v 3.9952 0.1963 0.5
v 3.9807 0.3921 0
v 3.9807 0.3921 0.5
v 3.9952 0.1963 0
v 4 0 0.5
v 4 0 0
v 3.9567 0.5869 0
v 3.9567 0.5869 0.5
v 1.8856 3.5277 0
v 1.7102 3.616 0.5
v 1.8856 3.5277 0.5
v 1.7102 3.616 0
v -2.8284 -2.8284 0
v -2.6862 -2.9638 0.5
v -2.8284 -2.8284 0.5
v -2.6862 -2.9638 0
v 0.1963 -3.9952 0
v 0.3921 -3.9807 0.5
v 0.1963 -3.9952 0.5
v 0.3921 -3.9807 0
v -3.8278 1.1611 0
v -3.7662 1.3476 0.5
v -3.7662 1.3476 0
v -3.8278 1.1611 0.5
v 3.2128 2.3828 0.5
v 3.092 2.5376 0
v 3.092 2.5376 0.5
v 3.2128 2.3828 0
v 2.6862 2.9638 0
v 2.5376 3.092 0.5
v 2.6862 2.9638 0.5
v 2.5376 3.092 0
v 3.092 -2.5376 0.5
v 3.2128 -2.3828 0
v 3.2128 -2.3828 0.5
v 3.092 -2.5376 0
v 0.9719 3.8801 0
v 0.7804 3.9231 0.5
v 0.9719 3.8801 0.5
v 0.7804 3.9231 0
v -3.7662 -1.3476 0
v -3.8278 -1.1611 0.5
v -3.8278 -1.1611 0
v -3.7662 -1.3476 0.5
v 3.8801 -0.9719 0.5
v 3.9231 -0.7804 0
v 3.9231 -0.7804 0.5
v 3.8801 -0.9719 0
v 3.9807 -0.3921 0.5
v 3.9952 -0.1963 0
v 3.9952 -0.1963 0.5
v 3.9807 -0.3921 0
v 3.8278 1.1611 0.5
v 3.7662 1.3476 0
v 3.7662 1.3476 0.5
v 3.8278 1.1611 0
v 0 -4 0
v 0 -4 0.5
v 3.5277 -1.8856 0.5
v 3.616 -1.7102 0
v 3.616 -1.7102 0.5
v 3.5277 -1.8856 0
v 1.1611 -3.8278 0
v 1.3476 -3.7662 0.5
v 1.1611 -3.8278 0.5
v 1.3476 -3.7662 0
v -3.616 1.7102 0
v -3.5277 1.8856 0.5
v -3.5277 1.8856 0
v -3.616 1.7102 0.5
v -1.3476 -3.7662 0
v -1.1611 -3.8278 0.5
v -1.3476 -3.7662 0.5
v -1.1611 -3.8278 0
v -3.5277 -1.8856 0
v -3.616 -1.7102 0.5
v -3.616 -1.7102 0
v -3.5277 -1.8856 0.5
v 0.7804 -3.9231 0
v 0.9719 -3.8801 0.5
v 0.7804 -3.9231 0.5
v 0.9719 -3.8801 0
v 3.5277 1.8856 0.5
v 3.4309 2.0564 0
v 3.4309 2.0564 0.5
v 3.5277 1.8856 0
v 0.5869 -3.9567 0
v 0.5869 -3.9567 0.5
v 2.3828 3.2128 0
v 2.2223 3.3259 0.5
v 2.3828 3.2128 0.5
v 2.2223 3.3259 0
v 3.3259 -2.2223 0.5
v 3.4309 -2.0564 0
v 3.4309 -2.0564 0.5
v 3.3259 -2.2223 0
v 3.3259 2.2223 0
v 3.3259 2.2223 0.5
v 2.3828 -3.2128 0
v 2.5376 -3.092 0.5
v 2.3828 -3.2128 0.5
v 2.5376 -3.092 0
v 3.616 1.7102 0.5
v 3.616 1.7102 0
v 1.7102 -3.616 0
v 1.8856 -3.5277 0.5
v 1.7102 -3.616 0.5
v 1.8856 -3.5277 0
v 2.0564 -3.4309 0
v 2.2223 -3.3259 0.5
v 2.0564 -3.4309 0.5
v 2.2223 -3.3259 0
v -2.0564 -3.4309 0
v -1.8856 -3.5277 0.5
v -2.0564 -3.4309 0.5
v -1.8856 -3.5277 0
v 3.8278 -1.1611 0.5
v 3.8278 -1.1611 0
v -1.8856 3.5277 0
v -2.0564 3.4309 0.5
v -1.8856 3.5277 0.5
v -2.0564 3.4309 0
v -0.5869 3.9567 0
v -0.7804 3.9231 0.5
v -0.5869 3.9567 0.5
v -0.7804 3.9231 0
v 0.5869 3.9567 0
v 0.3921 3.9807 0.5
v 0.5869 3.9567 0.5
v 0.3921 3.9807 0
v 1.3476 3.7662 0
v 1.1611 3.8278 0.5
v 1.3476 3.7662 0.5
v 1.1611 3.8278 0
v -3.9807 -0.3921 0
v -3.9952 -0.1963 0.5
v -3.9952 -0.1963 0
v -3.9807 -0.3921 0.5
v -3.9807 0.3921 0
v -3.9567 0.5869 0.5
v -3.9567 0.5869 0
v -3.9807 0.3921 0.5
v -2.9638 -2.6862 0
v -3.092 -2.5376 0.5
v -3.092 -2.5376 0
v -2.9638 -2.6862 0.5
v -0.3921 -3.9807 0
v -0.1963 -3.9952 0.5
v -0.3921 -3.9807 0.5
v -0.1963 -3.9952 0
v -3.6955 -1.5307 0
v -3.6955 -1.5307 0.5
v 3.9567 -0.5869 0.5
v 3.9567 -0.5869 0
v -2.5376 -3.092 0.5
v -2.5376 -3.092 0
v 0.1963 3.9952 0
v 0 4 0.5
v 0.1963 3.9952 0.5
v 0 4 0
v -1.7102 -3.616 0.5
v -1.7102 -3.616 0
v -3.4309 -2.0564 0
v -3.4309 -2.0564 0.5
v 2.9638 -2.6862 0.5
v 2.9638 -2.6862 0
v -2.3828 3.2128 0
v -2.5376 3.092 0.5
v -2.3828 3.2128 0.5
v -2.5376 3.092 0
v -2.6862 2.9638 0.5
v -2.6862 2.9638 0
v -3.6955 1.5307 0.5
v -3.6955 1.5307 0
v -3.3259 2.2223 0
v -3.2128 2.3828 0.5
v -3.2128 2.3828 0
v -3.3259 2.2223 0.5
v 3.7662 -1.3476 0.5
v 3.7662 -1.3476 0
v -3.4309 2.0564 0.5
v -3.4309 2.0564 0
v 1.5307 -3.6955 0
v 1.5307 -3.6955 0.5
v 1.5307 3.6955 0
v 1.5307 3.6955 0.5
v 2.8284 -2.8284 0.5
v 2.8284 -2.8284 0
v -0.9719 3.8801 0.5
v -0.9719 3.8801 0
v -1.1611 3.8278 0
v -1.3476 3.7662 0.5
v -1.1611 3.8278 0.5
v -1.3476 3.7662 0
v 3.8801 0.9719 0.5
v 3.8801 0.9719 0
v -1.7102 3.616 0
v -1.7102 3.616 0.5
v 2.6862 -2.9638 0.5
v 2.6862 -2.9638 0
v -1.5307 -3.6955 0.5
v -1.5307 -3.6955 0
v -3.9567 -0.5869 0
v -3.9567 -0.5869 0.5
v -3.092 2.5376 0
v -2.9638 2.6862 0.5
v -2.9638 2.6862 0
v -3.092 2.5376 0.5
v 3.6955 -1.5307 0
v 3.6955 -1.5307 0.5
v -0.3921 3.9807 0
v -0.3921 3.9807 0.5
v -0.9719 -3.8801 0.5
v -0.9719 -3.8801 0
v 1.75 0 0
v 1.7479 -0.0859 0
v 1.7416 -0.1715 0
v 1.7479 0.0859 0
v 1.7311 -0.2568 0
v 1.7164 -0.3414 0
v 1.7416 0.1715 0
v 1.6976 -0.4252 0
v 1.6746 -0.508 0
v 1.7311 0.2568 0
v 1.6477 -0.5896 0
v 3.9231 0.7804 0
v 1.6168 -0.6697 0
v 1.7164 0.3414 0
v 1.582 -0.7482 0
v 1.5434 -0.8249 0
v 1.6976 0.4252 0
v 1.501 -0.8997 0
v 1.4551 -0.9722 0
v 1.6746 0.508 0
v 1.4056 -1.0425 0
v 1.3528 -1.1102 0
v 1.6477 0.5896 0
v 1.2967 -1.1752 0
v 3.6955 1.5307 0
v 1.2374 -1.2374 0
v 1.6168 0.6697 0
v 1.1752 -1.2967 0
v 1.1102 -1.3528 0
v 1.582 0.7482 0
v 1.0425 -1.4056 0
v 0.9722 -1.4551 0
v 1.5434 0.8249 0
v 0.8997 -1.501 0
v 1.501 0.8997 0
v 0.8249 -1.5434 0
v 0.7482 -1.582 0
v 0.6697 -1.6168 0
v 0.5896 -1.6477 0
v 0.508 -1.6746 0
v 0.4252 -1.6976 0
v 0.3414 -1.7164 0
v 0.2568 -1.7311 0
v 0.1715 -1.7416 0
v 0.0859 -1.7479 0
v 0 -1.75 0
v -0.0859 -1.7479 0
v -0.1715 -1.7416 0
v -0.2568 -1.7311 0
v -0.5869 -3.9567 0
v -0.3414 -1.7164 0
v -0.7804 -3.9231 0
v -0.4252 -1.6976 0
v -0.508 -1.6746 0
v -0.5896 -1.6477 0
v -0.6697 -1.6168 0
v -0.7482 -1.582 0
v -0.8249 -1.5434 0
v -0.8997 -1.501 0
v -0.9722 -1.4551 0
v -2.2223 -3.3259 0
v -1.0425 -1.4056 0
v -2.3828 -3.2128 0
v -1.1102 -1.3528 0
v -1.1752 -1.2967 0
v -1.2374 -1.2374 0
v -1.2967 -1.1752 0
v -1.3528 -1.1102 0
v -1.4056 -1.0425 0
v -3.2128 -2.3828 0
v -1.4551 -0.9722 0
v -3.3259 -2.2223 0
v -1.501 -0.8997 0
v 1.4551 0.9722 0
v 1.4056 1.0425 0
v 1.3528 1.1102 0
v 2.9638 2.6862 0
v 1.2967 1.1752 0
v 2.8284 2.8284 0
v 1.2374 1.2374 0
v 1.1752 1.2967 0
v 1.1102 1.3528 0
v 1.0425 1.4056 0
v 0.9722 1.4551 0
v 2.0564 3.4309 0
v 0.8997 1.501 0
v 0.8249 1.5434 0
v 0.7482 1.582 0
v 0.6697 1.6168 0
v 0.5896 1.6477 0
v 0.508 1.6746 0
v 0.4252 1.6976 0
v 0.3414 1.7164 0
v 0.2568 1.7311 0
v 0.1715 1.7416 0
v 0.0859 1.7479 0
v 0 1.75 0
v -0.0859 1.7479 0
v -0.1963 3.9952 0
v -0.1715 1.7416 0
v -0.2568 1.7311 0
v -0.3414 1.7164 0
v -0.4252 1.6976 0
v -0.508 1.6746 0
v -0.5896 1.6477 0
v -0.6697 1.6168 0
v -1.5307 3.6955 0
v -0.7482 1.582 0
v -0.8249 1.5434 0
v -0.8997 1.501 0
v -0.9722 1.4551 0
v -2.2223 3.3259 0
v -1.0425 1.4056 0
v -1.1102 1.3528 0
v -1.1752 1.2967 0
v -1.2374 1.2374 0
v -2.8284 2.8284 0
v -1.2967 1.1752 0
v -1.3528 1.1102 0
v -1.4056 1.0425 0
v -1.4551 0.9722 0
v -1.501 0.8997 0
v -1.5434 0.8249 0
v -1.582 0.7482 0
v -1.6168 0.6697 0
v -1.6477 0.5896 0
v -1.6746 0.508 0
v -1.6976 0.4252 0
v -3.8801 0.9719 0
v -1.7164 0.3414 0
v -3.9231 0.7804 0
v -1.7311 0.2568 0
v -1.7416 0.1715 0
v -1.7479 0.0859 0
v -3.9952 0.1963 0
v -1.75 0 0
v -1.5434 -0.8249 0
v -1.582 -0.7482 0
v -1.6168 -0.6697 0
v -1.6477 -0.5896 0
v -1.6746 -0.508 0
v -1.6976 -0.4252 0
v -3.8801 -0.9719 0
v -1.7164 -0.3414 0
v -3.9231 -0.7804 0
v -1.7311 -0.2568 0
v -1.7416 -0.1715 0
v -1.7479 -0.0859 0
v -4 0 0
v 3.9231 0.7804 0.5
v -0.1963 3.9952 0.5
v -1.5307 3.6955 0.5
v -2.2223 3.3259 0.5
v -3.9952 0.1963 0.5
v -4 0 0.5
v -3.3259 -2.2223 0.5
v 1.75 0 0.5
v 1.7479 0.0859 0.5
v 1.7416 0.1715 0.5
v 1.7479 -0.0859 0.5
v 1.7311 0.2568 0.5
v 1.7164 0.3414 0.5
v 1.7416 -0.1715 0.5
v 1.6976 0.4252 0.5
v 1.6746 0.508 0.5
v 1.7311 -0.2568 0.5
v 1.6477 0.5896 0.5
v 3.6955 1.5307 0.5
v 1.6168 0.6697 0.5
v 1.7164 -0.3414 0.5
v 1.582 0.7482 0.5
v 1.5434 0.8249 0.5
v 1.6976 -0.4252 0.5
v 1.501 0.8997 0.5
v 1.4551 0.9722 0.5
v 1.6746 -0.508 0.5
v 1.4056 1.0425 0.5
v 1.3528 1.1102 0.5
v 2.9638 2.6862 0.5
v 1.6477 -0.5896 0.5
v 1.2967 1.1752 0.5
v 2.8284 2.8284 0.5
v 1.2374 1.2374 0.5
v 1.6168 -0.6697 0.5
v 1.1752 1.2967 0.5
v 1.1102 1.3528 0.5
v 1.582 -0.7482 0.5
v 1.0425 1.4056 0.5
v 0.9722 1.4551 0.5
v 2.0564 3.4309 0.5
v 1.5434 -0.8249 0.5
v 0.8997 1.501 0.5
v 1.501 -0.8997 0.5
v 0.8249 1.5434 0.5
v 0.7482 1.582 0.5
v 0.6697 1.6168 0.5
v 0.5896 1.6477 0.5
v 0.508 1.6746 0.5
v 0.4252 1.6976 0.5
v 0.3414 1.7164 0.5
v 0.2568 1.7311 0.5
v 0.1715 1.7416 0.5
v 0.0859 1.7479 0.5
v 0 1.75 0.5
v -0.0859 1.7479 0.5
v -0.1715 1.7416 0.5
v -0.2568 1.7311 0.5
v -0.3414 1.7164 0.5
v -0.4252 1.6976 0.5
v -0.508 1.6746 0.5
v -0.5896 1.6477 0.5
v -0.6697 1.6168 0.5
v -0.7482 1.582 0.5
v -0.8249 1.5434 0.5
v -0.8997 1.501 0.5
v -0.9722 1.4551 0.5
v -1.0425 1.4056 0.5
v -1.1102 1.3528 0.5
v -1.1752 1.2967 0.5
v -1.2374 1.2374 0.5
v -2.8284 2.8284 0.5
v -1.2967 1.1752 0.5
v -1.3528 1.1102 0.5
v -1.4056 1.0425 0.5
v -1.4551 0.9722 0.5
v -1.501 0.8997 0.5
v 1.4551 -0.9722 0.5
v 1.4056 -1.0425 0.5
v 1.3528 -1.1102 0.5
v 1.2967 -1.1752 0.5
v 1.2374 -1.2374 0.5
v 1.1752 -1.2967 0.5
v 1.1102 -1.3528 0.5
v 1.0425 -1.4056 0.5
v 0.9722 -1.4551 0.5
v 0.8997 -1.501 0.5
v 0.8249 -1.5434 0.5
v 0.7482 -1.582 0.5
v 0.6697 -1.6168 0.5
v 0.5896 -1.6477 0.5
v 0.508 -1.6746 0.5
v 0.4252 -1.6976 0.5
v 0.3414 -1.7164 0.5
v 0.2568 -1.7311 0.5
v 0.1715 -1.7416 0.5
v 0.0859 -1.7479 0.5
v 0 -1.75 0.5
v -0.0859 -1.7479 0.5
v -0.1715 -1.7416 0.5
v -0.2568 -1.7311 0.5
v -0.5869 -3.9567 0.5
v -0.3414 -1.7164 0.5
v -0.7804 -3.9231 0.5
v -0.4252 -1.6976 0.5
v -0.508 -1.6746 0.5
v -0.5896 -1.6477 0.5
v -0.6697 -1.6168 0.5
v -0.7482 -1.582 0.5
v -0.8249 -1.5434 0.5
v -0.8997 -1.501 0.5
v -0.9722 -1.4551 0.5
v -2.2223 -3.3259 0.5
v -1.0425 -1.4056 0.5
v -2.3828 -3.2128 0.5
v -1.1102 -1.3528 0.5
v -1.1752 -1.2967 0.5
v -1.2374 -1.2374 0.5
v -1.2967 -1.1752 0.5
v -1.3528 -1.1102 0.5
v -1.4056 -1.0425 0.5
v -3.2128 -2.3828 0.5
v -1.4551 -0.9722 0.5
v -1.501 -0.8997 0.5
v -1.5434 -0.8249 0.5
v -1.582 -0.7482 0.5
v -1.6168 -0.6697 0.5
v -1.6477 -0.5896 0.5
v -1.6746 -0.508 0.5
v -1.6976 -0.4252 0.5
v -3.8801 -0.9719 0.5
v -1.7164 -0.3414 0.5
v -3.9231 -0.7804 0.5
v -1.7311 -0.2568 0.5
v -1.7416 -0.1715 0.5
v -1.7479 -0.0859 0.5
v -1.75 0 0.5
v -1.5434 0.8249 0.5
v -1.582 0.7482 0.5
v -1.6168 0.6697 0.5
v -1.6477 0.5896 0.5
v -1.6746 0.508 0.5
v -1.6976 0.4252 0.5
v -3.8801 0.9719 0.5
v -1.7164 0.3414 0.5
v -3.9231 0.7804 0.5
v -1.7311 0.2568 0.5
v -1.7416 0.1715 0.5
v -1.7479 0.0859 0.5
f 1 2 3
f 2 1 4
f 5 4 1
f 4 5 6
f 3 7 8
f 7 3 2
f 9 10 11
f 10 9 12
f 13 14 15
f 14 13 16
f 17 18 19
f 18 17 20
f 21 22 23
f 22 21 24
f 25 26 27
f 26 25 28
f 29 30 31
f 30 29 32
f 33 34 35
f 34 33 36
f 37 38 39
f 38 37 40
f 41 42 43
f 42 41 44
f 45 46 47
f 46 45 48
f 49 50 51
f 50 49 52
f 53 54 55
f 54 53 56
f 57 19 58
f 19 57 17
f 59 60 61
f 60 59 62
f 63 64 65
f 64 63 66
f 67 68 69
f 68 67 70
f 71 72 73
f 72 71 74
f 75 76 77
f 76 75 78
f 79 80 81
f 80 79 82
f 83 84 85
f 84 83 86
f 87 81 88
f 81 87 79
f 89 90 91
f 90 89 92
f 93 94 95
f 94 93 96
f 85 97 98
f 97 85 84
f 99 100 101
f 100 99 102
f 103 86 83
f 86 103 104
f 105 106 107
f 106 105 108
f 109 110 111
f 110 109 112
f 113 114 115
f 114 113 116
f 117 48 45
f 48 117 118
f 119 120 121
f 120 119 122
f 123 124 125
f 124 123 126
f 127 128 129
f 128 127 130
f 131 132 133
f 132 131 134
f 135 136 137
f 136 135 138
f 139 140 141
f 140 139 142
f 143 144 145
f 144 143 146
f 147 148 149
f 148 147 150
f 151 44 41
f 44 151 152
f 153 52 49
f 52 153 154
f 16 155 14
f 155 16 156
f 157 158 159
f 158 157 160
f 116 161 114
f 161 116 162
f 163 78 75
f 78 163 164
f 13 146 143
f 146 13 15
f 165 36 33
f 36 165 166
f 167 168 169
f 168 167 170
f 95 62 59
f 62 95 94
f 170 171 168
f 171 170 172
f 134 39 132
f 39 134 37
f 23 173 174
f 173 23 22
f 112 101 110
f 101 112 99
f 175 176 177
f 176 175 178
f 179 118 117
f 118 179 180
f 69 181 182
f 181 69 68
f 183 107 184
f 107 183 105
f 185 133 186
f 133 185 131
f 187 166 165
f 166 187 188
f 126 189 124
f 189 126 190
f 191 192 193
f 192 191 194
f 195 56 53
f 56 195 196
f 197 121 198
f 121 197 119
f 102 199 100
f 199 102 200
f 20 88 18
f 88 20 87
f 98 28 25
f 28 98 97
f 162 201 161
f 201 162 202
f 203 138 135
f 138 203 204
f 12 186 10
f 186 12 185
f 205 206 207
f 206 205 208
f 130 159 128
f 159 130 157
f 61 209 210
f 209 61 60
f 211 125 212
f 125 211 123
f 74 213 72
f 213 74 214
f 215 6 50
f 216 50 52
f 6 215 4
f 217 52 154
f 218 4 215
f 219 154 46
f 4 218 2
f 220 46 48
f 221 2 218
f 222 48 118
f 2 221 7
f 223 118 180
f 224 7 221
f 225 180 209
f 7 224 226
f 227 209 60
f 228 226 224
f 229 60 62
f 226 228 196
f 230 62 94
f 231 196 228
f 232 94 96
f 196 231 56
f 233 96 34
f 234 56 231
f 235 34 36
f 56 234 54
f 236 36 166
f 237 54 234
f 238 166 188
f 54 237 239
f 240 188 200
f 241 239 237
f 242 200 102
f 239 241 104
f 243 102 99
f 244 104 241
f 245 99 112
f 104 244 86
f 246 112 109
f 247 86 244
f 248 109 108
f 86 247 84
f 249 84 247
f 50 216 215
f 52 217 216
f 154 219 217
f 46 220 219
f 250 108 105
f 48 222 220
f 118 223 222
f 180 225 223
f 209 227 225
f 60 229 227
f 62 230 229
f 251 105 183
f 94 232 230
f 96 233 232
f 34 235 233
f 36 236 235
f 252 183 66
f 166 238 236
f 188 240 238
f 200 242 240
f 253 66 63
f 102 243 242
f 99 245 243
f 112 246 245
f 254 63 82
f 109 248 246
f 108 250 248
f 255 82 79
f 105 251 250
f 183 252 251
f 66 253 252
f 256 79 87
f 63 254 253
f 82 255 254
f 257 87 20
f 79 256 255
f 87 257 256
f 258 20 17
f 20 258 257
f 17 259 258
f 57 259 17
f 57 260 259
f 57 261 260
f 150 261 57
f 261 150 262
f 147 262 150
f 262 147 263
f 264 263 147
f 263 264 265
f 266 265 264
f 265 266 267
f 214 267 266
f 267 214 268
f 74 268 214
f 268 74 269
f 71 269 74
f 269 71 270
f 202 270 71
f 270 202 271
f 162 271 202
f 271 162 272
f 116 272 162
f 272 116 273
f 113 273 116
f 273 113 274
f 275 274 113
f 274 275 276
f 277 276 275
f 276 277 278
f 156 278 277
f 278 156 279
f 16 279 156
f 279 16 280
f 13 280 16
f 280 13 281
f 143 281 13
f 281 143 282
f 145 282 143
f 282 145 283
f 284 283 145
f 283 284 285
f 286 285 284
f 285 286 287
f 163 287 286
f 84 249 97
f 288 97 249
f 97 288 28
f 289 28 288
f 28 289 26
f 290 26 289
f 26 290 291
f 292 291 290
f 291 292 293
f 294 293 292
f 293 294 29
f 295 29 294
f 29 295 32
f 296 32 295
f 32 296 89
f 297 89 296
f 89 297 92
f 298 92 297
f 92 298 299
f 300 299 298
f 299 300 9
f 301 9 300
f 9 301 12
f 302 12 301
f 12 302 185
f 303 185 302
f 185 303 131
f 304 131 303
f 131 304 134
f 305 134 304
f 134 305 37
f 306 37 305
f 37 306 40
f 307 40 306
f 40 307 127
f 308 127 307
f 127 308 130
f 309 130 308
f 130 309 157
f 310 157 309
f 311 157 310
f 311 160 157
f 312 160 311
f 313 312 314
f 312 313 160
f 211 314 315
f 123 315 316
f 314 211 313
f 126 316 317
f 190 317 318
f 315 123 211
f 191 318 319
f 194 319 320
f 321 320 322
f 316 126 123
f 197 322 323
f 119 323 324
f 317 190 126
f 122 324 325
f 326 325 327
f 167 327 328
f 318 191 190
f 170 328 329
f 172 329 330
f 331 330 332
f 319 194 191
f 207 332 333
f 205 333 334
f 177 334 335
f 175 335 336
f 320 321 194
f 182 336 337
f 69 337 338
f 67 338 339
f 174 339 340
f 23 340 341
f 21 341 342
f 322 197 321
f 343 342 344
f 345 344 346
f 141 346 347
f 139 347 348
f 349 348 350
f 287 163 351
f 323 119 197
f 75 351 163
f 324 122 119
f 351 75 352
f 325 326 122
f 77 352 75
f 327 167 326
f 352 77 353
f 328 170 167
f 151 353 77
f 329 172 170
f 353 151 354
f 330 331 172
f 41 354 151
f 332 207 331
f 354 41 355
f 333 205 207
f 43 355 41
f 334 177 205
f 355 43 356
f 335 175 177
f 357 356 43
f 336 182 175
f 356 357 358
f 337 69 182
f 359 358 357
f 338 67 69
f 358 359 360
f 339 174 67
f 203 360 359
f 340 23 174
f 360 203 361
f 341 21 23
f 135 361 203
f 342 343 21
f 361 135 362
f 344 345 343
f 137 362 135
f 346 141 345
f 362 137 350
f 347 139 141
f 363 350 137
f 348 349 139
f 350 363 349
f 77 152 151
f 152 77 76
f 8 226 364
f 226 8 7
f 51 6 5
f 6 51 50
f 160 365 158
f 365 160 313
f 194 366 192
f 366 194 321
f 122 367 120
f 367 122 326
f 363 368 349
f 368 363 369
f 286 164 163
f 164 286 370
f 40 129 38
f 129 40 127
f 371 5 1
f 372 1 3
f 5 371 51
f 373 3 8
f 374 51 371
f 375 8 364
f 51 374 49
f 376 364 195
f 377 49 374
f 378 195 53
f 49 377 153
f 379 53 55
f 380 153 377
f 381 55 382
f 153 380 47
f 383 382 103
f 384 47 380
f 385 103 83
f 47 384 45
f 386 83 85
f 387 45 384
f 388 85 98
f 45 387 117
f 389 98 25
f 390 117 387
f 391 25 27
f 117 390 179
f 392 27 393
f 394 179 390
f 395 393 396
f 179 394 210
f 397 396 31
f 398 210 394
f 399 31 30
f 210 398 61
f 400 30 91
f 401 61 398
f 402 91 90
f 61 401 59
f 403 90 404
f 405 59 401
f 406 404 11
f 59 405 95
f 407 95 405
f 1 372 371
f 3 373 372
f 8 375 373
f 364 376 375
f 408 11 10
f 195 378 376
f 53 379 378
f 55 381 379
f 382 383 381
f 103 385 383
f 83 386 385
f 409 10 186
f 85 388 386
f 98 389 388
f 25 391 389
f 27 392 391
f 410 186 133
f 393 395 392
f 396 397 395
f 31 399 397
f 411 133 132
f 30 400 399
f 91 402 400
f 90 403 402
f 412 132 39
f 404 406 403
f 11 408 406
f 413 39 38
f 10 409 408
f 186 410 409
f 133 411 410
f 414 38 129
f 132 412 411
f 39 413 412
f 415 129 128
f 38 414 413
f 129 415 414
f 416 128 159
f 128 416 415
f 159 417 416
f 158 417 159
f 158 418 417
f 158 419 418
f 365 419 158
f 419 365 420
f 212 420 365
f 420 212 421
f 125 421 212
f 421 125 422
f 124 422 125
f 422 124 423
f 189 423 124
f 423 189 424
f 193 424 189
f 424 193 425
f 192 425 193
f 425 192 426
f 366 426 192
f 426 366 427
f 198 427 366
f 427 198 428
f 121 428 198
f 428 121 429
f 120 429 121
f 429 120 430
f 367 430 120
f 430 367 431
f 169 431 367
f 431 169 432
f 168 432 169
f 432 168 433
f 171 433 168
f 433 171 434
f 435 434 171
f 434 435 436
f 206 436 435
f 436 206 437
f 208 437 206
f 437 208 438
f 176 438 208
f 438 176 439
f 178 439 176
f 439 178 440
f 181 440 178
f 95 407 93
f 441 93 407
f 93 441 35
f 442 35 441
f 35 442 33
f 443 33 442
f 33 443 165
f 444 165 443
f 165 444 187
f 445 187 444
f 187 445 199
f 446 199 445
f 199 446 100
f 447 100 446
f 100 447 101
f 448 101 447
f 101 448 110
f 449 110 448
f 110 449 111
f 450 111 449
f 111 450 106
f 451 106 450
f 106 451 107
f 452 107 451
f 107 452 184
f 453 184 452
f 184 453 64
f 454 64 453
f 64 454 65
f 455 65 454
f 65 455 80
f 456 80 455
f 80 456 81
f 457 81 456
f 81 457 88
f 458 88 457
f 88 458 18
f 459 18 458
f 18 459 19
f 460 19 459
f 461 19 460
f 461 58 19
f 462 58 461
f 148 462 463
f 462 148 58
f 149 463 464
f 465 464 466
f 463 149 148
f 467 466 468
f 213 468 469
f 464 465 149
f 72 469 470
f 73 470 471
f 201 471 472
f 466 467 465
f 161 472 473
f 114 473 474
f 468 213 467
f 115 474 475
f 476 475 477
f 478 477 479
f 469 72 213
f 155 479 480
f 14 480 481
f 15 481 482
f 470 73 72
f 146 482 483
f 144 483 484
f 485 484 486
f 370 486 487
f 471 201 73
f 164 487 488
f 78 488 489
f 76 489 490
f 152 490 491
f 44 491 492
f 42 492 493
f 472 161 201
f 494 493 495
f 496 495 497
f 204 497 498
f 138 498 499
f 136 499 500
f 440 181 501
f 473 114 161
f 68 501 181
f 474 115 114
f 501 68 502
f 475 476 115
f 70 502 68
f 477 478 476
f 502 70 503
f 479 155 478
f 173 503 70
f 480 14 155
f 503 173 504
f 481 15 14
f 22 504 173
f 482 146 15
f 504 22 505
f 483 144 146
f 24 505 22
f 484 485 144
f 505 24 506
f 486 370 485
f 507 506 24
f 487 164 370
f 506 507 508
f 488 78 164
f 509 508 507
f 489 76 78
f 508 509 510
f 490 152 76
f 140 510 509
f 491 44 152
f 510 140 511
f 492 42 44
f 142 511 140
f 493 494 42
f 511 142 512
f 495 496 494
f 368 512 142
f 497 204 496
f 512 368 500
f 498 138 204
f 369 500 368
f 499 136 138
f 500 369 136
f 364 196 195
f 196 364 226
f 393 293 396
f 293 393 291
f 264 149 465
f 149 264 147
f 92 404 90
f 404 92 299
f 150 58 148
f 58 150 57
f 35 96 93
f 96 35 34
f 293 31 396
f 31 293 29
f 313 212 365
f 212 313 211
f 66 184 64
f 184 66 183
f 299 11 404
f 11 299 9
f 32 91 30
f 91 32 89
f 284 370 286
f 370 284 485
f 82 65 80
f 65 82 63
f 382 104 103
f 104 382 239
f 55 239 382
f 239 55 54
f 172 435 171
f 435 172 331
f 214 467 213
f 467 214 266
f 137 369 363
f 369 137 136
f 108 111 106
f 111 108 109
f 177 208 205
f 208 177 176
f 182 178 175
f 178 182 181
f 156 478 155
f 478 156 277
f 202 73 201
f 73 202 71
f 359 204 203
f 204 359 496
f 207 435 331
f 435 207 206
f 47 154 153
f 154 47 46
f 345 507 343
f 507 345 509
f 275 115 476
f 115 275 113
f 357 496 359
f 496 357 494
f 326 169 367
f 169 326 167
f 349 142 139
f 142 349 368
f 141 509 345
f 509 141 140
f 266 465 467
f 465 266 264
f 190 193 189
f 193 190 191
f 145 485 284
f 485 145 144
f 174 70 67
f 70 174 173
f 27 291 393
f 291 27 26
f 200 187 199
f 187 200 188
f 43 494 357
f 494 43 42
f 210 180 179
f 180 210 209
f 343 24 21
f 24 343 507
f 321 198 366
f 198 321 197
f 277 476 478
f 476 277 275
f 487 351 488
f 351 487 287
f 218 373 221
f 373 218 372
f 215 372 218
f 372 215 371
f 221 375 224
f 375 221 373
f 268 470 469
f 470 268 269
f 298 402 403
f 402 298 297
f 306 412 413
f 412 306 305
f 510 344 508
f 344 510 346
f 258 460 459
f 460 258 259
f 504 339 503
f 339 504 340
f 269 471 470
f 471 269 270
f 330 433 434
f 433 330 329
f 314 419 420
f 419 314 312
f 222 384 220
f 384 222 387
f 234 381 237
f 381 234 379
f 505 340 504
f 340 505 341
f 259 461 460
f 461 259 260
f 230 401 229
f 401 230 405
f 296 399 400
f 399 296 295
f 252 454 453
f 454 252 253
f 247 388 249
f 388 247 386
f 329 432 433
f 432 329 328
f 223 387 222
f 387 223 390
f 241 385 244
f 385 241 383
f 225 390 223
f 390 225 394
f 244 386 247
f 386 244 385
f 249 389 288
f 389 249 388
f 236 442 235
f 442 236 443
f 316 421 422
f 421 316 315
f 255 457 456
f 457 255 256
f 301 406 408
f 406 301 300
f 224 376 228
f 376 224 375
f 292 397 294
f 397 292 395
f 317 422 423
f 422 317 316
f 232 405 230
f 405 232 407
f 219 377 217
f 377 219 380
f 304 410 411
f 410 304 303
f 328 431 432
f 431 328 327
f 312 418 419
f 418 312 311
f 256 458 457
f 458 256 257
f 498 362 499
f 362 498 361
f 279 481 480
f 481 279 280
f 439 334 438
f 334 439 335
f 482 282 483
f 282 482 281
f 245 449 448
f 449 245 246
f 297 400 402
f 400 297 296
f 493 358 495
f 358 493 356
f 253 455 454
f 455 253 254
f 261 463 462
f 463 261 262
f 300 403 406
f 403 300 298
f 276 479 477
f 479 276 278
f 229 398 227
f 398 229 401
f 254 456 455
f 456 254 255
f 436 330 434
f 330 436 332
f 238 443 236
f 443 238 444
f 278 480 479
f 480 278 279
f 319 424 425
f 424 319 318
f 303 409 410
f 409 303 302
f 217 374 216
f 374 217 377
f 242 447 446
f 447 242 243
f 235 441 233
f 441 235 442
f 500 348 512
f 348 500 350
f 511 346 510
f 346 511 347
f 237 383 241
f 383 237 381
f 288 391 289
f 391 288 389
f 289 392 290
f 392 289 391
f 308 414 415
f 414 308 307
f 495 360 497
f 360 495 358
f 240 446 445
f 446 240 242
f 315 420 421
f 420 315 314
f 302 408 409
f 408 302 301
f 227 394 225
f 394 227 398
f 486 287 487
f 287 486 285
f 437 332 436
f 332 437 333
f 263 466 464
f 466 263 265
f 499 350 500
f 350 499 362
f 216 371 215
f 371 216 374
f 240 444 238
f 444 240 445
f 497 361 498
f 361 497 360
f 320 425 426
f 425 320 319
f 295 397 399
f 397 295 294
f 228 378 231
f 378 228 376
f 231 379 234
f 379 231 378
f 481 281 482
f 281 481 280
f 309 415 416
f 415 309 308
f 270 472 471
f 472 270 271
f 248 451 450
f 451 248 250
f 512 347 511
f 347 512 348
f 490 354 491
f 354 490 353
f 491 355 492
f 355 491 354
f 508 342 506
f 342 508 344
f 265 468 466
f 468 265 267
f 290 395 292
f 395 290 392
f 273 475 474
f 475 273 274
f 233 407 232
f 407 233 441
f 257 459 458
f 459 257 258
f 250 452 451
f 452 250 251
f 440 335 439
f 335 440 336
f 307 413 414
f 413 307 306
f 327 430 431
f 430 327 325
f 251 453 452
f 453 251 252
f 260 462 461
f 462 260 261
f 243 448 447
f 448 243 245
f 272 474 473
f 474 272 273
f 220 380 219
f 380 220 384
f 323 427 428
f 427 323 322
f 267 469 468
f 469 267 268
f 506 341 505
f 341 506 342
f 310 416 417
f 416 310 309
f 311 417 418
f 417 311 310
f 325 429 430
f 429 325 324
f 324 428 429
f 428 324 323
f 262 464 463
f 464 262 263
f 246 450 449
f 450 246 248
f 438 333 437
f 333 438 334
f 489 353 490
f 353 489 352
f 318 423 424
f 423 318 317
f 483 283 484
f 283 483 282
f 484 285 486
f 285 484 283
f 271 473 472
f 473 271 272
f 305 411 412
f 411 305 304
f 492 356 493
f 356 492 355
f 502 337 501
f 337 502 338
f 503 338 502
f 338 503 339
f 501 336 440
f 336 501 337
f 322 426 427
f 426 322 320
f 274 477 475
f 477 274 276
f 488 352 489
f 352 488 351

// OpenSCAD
$fn = 128;

inner_d = 3.5;
outer_d = 8.0;
thickness = 0.5;

difference() {
  cylinder(d = outer_d, h = thickness);
  translate([0, 0, -0.1])
    cylinder(d = inner_d, h = thickness + 0.2);
}
